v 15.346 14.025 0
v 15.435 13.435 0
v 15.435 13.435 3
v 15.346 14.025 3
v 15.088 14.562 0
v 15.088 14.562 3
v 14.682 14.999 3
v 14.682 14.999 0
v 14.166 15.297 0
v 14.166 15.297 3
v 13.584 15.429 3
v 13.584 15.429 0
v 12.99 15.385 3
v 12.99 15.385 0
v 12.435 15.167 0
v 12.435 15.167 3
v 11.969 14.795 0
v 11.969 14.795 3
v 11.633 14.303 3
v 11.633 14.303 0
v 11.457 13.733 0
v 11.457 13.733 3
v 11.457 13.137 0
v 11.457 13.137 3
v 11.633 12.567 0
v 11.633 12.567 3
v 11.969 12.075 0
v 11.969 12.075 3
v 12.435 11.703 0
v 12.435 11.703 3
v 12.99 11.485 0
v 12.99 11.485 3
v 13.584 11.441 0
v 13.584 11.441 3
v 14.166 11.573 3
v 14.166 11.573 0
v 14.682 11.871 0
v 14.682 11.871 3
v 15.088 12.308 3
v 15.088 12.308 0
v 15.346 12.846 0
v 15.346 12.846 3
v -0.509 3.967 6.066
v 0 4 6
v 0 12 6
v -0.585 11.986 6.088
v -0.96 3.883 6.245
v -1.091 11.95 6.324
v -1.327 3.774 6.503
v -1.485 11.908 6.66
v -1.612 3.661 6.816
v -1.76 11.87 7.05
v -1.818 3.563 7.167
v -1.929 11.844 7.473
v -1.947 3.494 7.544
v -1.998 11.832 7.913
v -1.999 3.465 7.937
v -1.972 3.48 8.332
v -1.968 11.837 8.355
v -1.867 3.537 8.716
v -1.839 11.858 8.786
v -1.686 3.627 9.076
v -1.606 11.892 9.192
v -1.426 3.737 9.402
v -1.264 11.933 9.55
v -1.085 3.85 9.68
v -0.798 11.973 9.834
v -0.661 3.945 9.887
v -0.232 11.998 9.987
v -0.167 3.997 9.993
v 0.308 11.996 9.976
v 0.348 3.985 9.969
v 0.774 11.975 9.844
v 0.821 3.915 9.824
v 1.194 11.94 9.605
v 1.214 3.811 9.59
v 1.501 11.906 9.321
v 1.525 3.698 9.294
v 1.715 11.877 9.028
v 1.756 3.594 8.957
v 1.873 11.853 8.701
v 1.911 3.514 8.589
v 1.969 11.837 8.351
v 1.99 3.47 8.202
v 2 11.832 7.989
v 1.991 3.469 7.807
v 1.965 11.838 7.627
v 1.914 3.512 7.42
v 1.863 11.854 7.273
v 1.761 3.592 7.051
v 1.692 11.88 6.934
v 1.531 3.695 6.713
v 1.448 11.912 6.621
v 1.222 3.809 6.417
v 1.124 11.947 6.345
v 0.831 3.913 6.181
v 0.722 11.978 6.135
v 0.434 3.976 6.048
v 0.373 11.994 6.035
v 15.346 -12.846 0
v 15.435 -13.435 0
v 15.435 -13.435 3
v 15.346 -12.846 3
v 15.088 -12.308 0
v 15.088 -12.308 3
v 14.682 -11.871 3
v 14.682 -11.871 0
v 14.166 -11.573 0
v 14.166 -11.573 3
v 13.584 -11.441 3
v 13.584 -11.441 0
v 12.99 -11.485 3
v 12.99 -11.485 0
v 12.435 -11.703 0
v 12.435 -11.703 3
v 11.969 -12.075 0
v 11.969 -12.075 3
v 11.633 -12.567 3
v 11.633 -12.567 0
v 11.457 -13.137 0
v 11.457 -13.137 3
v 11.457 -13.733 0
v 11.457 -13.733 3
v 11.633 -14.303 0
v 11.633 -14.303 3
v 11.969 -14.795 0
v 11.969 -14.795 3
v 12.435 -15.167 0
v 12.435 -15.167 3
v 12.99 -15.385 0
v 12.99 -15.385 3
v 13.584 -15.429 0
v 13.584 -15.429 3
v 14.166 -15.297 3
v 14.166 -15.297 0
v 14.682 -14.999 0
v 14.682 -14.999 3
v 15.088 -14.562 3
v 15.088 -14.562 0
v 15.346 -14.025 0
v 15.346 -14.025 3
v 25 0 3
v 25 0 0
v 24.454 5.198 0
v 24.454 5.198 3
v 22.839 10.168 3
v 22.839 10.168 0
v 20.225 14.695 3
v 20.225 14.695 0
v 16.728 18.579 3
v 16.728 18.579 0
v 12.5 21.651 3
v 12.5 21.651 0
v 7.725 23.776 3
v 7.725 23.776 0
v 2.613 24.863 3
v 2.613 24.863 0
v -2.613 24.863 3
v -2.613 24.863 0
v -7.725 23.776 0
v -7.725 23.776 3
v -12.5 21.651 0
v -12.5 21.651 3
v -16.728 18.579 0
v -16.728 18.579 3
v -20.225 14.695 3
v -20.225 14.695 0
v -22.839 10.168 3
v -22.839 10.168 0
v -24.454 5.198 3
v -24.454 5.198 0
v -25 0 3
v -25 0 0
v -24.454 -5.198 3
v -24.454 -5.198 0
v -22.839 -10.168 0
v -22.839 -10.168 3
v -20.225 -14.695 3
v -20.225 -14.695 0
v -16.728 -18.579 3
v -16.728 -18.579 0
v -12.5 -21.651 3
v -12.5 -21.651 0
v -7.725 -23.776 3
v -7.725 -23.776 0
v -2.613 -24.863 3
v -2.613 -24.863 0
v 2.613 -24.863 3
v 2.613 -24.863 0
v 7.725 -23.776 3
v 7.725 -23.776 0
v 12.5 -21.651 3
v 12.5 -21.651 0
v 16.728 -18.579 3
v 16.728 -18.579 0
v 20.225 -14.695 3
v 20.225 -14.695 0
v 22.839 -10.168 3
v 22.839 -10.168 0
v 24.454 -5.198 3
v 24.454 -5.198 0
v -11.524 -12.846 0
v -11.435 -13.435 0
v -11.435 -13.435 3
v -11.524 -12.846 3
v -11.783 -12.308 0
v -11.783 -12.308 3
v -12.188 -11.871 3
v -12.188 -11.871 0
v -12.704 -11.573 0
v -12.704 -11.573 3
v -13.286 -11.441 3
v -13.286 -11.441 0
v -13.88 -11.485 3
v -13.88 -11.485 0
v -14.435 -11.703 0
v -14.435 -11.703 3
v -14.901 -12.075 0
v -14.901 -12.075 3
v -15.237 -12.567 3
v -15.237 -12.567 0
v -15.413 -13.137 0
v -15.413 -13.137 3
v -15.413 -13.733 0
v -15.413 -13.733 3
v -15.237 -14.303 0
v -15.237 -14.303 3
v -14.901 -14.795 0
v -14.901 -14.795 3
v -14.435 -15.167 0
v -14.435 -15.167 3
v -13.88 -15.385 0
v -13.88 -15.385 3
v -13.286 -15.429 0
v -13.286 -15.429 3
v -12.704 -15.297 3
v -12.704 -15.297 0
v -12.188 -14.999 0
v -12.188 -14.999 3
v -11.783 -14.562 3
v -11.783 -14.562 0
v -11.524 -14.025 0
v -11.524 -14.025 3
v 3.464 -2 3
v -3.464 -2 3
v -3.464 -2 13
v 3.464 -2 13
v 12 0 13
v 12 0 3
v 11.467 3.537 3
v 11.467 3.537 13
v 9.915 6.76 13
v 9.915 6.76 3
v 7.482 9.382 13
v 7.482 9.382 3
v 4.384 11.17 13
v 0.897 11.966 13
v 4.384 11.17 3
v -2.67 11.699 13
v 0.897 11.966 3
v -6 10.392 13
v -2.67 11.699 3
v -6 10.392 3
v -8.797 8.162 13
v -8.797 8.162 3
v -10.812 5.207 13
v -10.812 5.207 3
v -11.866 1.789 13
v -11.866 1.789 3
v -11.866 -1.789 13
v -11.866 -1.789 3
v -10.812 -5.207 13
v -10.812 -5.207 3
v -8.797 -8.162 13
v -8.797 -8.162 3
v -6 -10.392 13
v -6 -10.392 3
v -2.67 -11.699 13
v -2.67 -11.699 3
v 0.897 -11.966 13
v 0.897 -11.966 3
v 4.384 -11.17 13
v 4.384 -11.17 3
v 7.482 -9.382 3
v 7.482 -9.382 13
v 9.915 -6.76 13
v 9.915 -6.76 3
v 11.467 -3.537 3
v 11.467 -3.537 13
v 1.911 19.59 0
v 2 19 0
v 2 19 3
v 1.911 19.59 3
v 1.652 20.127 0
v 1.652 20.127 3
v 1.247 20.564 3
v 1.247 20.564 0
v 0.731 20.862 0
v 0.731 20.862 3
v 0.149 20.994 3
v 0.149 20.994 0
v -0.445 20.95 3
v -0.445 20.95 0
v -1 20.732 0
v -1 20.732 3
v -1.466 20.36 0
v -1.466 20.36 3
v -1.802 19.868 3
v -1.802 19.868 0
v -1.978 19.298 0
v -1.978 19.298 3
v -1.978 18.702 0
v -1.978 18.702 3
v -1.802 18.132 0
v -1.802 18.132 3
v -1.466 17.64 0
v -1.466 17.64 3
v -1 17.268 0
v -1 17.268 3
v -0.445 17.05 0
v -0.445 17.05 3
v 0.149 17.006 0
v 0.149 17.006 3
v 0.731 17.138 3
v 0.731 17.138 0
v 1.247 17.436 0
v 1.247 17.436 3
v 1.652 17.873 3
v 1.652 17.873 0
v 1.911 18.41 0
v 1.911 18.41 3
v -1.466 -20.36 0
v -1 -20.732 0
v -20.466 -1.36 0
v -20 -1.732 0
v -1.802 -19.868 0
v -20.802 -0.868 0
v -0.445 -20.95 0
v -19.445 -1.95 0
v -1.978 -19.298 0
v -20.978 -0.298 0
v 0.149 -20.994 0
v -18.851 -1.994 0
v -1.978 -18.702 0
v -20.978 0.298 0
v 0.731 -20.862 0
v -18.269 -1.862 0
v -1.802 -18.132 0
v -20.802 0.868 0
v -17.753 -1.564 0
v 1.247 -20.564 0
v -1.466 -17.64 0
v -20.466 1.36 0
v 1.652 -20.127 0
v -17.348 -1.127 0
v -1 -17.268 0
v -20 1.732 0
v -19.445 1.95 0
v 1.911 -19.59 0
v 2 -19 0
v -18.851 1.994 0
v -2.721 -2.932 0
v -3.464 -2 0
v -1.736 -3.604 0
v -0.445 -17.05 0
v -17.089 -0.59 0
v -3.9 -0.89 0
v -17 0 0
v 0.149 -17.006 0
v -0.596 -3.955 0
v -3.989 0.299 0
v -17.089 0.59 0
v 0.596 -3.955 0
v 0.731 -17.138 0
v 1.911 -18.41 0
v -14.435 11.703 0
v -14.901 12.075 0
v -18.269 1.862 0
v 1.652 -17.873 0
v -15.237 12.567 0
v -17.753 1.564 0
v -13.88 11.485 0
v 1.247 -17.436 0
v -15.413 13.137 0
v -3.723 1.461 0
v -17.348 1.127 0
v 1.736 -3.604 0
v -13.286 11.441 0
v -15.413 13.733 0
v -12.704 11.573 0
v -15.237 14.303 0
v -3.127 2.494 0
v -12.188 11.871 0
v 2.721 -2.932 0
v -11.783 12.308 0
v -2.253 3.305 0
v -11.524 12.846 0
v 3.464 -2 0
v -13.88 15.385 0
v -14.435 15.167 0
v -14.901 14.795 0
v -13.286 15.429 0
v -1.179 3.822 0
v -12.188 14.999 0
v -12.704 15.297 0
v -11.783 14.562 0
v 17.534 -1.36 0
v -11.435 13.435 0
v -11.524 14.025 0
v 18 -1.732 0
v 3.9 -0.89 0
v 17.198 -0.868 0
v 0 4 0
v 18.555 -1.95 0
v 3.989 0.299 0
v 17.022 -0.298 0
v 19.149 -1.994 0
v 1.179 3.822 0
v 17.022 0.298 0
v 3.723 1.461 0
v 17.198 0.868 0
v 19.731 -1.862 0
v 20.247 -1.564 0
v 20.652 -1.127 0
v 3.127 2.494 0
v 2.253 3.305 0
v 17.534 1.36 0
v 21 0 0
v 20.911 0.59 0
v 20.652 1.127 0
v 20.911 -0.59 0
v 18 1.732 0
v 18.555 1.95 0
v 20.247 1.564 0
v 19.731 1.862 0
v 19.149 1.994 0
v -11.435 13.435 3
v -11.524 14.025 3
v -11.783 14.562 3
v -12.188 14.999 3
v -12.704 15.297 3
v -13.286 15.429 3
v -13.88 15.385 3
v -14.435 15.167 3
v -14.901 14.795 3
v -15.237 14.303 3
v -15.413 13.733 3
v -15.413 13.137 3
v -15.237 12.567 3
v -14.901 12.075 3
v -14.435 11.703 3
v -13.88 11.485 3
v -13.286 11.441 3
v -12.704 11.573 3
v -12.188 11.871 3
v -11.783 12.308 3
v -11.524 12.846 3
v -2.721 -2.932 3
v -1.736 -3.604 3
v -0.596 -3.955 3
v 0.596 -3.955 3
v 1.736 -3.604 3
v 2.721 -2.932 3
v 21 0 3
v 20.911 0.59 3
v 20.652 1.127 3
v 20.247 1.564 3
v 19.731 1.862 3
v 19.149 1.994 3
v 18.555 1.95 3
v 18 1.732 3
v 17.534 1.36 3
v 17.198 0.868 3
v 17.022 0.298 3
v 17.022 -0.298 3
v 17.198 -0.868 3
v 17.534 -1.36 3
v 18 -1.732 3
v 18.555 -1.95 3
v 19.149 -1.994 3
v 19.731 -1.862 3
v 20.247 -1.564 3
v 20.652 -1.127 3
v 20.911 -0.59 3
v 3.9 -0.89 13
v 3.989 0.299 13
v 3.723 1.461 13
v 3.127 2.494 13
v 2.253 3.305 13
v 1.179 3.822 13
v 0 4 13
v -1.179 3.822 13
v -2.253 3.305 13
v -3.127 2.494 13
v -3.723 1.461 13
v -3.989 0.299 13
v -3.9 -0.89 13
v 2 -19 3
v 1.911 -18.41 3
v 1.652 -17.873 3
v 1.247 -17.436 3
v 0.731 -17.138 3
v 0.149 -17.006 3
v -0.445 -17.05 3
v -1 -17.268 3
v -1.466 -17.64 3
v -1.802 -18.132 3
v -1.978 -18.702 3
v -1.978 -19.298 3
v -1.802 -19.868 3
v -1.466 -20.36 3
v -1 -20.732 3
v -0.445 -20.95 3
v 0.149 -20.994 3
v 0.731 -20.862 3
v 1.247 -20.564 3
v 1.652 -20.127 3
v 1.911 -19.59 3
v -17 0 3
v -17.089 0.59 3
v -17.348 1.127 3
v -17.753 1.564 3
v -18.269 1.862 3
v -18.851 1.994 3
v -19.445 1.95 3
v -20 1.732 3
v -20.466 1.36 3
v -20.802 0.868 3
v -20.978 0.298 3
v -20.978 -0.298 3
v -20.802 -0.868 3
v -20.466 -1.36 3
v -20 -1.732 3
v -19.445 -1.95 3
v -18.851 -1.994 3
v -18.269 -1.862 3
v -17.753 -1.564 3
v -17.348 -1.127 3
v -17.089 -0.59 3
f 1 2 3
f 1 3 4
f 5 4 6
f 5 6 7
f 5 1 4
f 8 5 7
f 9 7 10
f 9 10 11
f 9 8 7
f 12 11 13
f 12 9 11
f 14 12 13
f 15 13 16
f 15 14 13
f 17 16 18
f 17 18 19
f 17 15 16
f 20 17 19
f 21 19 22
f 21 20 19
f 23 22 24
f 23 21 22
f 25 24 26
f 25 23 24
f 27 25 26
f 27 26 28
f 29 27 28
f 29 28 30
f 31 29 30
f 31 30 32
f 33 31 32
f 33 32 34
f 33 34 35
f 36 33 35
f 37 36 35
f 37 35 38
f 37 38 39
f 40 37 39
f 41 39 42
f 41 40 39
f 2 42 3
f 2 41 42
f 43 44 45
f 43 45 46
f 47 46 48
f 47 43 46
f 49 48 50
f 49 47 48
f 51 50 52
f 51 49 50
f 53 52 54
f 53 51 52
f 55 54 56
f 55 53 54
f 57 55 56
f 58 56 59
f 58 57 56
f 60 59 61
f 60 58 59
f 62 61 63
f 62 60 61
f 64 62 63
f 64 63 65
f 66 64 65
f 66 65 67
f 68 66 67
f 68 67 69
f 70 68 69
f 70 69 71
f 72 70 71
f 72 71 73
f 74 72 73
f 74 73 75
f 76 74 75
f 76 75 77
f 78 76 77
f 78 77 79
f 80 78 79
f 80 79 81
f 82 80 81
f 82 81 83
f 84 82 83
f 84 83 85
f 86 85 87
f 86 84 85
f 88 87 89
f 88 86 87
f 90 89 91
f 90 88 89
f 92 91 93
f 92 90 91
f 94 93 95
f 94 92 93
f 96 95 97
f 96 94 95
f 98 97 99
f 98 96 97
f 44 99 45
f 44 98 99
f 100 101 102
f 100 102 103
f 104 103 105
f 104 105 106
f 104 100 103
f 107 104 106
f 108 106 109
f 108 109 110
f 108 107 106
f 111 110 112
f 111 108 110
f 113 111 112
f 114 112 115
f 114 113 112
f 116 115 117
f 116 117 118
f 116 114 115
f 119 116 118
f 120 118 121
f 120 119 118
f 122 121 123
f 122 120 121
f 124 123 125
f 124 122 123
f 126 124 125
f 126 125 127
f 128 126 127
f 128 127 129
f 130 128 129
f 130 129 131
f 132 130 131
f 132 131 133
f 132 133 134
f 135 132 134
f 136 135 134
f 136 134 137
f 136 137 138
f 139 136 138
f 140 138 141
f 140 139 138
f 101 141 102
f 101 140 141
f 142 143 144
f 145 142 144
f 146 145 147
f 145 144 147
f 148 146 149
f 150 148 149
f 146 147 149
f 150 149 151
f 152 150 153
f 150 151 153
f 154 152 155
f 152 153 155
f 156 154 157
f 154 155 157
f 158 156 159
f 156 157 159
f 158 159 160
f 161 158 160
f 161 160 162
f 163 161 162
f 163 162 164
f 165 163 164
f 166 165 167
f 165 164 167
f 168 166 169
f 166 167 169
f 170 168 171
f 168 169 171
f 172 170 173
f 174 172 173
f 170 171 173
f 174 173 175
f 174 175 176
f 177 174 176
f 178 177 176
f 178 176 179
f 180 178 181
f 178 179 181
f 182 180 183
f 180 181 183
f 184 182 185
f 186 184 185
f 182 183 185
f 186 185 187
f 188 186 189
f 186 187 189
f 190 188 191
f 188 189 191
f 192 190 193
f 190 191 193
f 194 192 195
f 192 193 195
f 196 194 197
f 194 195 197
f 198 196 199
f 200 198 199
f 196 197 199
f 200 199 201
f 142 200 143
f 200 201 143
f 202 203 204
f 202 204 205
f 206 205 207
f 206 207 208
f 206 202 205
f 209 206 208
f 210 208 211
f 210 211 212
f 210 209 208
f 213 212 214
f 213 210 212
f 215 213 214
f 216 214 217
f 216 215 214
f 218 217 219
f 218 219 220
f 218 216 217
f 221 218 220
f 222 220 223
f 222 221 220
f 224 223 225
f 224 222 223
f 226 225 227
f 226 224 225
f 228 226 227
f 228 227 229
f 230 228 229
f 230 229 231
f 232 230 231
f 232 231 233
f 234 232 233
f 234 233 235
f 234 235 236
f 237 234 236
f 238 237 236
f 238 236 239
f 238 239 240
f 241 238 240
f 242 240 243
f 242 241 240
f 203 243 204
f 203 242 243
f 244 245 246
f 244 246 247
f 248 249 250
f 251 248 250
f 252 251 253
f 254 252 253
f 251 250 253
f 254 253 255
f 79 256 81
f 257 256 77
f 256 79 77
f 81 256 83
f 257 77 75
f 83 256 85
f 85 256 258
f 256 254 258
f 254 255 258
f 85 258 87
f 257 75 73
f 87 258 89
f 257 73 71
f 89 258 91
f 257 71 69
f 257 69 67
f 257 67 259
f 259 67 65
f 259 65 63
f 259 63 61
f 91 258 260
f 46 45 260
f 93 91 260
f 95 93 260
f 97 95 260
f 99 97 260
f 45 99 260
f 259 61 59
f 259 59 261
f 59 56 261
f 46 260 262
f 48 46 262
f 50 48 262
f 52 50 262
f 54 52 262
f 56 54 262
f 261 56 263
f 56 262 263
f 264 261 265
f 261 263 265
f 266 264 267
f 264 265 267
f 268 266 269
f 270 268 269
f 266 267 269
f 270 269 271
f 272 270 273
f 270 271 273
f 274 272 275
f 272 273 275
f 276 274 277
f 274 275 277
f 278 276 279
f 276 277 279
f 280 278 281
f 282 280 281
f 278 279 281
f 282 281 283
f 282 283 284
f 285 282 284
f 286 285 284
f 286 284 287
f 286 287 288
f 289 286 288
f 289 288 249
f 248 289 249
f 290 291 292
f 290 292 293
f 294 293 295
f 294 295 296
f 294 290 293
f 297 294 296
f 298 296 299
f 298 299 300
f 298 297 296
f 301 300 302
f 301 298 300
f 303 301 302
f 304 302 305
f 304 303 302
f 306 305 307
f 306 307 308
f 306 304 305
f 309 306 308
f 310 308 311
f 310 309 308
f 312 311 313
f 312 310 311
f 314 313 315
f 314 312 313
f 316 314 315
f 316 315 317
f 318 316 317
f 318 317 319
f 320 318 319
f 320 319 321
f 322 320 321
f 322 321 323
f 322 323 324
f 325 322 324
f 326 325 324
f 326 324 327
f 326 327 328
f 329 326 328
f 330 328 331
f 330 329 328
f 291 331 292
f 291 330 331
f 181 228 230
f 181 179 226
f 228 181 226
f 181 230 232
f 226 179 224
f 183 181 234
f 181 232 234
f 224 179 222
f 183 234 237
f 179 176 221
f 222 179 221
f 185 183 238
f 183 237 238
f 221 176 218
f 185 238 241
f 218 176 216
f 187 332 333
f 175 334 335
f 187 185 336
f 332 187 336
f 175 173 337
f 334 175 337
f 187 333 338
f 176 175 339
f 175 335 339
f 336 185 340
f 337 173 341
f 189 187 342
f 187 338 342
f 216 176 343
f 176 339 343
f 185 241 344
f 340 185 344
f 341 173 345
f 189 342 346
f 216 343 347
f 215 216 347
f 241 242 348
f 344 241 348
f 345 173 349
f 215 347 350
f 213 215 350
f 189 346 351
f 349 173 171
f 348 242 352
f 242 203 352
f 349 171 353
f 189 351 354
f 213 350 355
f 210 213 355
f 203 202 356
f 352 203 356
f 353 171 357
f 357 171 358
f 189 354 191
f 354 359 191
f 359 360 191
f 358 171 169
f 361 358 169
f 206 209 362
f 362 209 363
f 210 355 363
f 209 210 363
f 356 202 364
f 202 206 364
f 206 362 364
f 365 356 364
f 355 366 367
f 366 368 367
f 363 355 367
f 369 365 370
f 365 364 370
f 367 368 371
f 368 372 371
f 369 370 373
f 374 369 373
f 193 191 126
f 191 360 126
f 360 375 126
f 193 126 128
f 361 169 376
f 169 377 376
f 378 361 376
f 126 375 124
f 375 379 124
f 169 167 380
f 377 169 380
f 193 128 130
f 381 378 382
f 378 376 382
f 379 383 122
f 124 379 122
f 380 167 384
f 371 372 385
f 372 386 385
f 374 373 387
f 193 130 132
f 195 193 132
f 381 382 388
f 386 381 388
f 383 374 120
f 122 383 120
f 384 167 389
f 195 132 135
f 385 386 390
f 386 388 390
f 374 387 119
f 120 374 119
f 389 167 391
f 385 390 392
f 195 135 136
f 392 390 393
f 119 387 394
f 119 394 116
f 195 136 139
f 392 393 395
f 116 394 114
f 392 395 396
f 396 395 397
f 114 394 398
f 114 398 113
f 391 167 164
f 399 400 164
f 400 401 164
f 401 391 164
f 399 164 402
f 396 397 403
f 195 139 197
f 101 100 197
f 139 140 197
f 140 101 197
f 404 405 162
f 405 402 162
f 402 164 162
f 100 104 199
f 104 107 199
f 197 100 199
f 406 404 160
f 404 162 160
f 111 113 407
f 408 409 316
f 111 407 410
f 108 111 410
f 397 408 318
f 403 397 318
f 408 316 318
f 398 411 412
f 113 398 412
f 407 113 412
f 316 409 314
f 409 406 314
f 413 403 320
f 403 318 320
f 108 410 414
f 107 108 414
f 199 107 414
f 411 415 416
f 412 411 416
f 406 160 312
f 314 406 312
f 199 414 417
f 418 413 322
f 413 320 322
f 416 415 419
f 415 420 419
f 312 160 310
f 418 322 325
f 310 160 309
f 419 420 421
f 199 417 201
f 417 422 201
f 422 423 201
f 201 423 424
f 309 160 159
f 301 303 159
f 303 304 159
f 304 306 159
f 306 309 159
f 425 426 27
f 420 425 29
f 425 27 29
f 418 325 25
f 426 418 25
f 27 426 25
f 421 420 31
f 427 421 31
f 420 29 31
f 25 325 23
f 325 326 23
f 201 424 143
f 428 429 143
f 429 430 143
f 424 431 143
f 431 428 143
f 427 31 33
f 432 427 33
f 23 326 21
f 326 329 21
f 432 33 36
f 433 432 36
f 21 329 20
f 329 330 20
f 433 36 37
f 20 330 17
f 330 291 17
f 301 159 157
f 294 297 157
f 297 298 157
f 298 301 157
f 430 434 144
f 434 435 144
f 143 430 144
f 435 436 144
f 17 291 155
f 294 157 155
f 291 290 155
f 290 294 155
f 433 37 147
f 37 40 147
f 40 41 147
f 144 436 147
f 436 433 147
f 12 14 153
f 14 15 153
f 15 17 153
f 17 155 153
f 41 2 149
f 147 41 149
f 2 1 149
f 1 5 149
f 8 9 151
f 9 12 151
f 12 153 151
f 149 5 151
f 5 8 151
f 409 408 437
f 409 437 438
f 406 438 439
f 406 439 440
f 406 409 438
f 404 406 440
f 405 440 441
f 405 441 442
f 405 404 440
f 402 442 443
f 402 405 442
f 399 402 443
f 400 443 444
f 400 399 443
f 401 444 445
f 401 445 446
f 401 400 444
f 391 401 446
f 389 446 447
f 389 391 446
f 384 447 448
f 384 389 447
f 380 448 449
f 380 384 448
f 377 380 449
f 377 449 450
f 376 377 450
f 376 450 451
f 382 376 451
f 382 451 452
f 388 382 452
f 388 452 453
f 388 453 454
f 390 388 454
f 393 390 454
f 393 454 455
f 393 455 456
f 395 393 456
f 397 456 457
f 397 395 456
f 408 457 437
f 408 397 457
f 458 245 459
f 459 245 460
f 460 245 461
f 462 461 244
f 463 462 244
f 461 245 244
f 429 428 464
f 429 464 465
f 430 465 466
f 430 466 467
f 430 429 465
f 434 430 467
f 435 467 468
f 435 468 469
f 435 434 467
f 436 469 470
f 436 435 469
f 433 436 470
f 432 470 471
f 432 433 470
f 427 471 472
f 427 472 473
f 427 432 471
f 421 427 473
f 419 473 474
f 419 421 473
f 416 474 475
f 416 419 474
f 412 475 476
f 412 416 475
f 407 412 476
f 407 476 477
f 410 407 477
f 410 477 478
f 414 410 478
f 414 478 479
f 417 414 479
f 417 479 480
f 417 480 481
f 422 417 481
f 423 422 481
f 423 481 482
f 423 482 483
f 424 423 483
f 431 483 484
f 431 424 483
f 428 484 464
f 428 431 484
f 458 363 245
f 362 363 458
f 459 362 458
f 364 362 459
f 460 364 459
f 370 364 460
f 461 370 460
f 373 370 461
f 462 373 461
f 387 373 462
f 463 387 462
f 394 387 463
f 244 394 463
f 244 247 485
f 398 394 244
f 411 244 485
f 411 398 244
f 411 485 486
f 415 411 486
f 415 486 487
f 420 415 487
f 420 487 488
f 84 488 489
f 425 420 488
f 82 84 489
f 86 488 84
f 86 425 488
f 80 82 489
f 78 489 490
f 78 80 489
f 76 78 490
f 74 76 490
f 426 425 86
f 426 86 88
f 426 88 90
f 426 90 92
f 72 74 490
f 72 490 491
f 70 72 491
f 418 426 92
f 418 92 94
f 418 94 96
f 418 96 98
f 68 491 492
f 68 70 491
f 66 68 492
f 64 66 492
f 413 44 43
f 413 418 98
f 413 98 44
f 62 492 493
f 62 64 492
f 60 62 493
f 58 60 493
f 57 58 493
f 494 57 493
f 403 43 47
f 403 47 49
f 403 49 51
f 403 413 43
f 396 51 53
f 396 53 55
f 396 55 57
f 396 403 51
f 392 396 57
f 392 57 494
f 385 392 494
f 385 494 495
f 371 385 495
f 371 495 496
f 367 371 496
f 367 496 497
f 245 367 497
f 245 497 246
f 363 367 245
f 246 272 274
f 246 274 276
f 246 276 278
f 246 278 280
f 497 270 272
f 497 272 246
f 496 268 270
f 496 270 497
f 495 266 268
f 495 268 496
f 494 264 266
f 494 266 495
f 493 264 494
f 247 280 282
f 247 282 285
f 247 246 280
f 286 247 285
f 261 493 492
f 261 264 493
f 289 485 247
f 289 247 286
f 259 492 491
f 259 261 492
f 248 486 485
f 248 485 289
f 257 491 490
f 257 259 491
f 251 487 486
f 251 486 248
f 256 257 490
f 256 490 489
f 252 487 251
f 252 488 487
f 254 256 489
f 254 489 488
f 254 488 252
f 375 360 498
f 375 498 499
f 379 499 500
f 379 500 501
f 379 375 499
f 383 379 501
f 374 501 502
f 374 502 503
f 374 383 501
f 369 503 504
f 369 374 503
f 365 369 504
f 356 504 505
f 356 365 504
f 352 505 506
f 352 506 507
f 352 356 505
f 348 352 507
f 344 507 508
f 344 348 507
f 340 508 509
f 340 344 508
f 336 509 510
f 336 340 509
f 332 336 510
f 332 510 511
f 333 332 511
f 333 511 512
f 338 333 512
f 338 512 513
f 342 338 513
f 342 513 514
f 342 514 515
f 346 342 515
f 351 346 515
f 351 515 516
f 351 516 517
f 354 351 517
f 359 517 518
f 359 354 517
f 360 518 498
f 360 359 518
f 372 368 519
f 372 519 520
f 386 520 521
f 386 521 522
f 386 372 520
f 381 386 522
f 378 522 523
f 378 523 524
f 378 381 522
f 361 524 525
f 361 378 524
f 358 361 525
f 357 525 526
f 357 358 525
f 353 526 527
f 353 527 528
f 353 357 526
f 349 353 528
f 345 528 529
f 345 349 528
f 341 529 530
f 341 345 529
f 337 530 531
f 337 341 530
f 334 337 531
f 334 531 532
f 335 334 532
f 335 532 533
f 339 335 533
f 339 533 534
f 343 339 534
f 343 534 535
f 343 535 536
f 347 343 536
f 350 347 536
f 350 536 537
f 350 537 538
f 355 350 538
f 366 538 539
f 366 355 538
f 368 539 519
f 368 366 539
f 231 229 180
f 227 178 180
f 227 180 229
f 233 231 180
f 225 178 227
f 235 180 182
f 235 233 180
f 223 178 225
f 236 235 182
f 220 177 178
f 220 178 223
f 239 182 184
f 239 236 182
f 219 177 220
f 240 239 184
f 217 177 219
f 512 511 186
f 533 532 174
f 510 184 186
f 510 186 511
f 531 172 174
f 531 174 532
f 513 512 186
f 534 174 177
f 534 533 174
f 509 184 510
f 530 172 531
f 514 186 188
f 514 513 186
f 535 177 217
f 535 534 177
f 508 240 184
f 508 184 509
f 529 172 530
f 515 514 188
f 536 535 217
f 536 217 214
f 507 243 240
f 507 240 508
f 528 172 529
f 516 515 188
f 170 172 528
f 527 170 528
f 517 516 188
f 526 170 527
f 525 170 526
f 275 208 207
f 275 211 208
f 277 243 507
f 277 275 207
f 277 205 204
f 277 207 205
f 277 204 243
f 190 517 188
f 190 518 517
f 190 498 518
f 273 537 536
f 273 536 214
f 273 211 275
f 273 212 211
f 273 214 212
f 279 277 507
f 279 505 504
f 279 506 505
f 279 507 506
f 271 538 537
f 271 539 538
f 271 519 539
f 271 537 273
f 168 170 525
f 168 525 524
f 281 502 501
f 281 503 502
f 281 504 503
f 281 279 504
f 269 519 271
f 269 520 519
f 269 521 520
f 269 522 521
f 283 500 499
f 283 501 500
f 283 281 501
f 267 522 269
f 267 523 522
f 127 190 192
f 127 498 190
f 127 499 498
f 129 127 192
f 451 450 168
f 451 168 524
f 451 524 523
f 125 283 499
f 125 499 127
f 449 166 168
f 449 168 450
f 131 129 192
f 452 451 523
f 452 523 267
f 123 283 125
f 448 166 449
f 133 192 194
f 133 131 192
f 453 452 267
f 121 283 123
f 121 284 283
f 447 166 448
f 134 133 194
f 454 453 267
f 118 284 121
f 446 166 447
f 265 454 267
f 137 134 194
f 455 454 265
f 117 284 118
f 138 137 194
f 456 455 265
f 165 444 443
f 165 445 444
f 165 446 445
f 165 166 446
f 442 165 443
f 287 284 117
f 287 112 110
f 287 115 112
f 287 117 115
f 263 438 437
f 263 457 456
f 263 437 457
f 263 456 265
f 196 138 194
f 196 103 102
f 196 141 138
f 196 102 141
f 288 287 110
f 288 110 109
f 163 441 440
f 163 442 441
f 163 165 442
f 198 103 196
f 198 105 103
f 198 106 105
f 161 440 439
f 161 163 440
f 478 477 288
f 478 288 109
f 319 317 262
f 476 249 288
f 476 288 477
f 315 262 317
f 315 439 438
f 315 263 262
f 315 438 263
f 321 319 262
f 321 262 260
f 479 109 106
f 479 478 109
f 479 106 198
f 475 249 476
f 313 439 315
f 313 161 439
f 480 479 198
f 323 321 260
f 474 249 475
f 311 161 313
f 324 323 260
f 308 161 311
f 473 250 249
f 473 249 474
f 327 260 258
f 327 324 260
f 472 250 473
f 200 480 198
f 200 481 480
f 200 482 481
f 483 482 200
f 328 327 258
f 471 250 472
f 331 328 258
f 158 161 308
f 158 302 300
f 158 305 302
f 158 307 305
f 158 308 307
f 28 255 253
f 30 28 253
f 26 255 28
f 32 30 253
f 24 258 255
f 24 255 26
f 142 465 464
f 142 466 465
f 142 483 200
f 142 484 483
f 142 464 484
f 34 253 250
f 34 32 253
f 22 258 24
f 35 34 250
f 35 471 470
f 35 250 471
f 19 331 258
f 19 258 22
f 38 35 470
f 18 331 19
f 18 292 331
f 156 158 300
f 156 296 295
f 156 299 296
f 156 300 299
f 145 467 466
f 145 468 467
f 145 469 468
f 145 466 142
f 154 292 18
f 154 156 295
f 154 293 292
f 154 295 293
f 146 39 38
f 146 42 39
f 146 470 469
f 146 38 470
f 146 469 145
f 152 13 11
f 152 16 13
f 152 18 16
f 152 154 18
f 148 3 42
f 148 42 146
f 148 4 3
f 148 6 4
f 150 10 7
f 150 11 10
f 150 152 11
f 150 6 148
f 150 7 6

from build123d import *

# Parameters (mm, degrees)
SKETCH_1_R          = 25
SKETCH_1_R_2        = 2
SKETCH_1_R_3        = 4
EXTRUDE_1_DEPTH     = 3
SKETCH_2_R          = 12
EXTRUDE_2_DEPTH     = 10
CUT_EXTRUDE_START   = -24
CUT_EXTRUDE_1_DEPTH = 24
SKETCH_4_R          = 2
CUT_EXTRUDE_2_DEPTH = 19


with BuildPart() as part:
    # 草图1 → 凸台-拉伸1 (new body)
    with BuildSketch(Plane.XY):
        Circle(SKETCH_1_R)
        with Locations((0, 19)):
            Circle(SKETCH_1_R_2, mode=Mode.SUBTRACT)
        with Locations((13.435028843, 13.435028843)):
            Circle(SKETCH_1_R_2, mode=Mode.SUBTRACT)
        with Locations((19, 0)):
            Circle(SKETCH_1_R_2, mode=Mode.SUBTRACT)
        with Locations((13.435028843, -13.435028843)):
            Circle(SKETCH_1_R_2, mode=Mode.SUBTRACT)
        with Locations((0, -19)):
            Circle(SKETCH_1_R_2, mode=Mode.SUBTRACT)
        with Locations((-13.435028843, -13.435028843)):
            Circle(SKETCH_1_R_2, mode=Mode.SUBTRACT)
        with Locations((-19, 0)):
            Circle(SKETCH_1_R_2, mode=Mode.SUBTRACT)
        with Locations((-13.435028843, 13.435028843)):
            Circle(SKETCH_1_R_2, mode=Mode.SUBTRACT)
        Circle(SKETCH_1_R_3, mode=Mode.SUBTRACT)
    extrude(amount=EXTRUDE_1_DEPTH)

    # 草图2 → 凸台-拉伸2 (add)
    with BuildSketch(Plane.XY.offset(3)):
        Circle(SKETCH_2_R)
    extrude(amount=EXTRUDE_2_DEPTH)

    # 草图3 → 切除-拉伸1 (cut)
    with BuildSketch(Plane.XY.offset(13).offset(CUT_EXTRUDE_START)):
        with BuildLine():
            Line((-3.464101615, -2), (3.464101615, -2))
            ThreePointArc((3.464101615, -2), (0, 4), (-3.464101615, -2))
        make_face()
    extrude(amount=CUT_EXTRUDE_1_DEPTH, mode=Mode.SUBTRACT)

    # 草图4 → 切除-拉伸2 (cut)
    with BuildSketch(Plane(origin=(0, -2, 0), x_dir=(1, 0, 0), z_dir=(0, 1, 0))):
        with Locations(Location((0, -8, 0), (0, 0, 90))):
            Circle(SKETCH_4_R)
    extrude(amount=CUT_EXTRUDE_2_DEPTH, mode=Mode.SUBTRACT)


solid = part.part
